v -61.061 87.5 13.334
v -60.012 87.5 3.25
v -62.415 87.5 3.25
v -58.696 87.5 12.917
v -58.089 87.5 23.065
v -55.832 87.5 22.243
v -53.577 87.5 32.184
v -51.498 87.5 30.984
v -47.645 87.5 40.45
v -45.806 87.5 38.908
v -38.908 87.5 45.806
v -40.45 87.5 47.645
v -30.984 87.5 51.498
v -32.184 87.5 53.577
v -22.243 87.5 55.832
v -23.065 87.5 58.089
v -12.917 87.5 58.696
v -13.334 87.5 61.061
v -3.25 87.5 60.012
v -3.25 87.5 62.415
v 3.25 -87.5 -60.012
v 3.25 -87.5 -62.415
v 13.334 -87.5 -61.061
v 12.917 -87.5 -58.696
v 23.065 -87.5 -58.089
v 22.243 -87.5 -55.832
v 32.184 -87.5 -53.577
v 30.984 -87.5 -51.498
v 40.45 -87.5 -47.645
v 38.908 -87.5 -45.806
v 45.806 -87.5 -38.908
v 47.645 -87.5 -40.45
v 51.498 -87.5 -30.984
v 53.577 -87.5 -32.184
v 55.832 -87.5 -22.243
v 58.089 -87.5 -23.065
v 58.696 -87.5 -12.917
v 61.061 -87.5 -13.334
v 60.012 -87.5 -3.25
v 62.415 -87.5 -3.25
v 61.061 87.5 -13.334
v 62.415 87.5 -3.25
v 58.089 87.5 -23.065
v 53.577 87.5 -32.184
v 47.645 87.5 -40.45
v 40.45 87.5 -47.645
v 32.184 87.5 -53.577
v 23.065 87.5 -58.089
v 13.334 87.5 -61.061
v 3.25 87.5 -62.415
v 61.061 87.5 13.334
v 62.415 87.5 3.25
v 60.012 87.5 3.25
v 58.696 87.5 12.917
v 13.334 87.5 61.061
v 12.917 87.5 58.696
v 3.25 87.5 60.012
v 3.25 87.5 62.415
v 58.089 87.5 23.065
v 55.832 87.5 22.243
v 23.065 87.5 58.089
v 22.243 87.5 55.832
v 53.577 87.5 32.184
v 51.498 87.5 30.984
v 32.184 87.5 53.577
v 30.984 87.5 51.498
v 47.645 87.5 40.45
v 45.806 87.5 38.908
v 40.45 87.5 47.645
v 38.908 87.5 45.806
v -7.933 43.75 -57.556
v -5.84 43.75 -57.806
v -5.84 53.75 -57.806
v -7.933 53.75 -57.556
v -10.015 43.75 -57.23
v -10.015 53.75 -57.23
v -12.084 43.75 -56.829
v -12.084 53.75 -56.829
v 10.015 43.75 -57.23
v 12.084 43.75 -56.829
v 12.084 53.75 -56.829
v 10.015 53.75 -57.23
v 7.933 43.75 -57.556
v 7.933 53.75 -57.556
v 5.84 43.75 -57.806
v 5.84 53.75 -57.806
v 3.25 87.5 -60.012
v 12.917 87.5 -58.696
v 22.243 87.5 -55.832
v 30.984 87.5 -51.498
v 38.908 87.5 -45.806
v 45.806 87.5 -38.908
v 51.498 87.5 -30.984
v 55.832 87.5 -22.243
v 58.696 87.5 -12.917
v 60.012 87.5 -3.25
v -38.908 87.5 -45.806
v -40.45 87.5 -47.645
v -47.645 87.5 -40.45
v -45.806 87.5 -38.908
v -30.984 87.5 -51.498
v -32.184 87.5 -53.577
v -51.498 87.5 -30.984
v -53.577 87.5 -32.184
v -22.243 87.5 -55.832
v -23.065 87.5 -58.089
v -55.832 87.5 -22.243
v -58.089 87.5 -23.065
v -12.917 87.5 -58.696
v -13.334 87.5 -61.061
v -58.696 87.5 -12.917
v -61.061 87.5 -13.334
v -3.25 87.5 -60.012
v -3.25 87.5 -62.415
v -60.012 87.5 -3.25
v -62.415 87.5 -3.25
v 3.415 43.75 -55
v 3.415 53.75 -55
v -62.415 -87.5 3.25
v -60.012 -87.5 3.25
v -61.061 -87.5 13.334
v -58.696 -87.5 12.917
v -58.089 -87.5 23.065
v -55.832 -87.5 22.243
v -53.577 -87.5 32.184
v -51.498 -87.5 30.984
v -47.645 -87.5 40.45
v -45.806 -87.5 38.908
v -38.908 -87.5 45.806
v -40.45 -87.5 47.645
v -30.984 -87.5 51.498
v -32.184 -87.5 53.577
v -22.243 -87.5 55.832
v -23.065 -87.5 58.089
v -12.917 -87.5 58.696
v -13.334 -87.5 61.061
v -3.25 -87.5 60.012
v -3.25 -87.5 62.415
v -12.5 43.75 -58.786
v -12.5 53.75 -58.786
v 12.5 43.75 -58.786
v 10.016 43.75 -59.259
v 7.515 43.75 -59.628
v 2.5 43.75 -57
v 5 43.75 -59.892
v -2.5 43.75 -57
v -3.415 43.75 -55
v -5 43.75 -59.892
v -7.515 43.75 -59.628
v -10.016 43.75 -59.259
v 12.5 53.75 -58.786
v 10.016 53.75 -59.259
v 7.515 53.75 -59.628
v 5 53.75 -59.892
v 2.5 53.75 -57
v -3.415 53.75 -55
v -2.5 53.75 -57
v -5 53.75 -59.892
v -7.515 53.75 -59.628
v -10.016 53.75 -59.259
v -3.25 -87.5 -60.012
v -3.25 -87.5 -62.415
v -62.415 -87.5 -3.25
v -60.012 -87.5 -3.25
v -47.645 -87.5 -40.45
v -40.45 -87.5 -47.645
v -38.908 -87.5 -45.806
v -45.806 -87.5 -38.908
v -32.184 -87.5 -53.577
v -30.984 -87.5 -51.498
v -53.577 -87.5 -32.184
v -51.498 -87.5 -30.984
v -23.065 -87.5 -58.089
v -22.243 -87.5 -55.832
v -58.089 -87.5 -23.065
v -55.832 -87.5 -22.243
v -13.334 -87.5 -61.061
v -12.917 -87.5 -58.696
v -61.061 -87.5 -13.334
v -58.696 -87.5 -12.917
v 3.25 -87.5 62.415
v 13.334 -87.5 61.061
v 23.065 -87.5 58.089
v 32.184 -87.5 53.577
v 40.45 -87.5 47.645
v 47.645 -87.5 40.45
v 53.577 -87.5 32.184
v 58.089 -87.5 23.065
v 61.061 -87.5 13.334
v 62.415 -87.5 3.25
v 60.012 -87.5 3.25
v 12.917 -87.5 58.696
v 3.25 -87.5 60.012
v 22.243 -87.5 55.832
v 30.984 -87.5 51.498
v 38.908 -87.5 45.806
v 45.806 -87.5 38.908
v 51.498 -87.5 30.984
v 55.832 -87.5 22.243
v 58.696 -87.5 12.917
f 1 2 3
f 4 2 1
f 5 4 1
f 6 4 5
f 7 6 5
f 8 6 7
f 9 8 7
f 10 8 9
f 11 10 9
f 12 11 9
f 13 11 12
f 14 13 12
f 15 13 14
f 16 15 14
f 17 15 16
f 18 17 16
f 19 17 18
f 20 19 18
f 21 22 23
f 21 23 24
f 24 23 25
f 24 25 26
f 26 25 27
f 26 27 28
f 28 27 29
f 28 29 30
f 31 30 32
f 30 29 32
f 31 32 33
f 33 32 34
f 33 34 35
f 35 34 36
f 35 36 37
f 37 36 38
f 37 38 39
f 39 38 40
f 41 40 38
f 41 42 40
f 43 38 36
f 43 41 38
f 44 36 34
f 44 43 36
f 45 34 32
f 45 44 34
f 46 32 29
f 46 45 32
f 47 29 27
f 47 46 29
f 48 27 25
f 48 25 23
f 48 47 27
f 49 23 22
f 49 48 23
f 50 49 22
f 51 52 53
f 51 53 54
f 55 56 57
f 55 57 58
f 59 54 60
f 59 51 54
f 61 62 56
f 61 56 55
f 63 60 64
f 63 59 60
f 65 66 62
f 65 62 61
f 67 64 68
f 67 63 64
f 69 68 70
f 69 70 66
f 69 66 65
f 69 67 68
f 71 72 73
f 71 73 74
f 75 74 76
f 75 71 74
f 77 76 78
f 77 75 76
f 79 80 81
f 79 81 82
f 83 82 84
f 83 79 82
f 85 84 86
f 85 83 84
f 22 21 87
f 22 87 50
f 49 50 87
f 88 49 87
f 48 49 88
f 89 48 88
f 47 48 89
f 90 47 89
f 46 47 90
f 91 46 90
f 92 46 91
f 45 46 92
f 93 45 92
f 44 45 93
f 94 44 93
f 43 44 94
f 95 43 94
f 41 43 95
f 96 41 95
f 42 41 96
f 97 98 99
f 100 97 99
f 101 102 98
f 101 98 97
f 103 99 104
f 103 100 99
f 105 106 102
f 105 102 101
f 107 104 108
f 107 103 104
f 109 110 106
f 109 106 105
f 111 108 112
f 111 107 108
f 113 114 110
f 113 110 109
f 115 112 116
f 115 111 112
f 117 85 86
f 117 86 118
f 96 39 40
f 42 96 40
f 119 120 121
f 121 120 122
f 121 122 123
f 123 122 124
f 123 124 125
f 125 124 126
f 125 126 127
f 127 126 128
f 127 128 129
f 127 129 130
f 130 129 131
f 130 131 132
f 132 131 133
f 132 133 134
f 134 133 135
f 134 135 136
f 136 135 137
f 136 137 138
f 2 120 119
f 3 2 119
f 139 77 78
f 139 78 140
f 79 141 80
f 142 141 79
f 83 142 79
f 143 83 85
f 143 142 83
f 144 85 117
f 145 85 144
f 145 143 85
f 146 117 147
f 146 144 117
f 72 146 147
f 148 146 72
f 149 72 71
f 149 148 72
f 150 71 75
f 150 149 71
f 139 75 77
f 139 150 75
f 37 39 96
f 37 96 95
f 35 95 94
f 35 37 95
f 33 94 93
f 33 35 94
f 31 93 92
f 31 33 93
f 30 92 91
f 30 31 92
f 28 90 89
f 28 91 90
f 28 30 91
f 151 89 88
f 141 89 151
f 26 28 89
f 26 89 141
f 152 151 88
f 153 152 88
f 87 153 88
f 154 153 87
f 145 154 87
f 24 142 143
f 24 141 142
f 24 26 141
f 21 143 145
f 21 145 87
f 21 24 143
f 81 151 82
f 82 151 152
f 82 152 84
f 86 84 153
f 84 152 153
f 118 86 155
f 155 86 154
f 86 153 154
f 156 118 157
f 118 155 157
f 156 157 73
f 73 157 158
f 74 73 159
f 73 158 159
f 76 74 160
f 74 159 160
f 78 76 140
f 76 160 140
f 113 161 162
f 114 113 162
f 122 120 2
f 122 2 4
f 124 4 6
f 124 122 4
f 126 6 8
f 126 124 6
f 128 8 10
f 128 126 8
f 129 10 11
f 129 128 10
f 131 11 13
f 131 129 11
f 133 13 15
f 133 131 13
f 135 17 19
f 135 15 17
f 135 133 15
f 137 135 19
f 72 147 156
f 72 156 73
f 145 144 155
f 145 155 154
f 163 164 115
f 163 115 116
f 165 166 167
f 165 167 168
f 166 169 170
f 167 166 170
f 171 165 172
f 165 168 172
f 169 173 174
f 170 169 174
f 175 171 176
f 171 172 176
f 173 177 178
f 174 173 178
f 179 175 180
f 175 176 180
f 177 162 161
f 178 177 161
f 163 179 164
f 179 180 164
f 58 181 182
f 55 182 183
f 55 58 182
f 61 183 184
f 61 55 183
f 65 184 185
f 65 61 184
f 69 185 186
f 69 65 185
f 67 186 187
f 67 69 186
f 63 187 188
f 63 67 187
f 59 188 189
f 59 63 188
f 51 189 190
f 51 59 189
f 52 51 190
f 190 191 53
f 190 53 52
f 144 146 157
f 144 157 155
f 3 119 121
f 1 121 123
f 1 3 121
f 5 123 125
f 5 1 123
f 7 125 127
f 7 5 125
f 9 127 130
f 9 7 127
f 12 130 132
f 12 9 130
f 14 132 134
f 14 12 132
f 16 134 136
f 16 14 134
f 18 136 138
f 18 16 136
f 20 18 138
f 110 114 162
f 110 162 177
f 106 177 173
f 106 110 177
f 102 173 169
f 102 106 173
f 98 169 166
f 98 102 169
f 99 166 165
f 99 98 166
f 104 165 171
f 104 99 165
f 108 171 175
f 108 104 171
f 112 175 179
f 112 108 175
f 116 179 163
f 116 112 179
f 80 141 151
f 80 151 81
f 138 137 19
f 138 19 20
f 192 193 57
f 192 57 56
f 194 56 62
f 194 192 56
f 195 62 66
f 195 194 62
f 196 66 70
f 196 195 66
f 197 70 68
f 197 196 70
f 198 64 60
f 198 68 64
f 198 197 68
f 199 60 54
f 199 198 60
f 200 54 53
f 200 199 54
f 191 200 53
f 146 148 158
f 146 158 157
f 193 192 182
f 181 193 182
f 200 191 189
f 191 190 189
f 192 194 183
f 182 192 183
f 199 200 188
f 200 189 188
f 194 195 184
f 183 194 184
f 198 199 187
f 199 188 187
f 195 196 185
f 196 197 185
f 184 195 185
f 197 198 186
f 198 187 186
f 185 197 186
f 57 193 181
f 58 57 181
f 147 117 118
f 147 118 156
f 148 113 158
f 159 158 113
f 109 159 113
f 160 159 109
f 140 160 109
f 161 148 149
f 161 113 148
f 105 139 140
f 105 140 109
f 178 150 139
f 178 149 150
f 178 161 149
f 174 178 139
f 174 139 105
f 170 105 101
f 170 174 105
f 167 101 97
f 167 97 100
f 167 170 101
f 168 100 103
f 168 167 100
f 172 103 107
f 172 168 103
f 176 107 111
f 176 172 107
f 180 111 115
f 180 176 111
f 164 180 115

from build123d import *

# Parameters (mm, degrees)
SKETCH1_R           = 62.5
SKETCH1_R_2         = 60.1
BOSS_EXTRUDE1_DEPTH = 87.5
SKETCH2_W           = 6.5
SKETCH2_H           = 2.487938712
CUT_EXTRUDE1_DEPTH  = 197.054839267
CIRPATTERN1_COUNT   = 4
EXTRUDE_THIN1_DEPTH = 10


with BuildPart() as part:
    # Sketch1 → Boss-Extrude1 (new, symmetric)
    with BuildSketch(Plane(origin=(0, 0, 0), x_dir=(1, 0, 0), z_dir=(0, 1, 0))):
        with Locations(Location((0, 0, 0), (0, 0, 270))):
            Circle(SKETCH1_R)
        with Locations(Location((0, 0, 0), (0, 0, 270))):
            Circle(SKETCH1_R_2, mode=Mode.SUBTRACT)
    extrude(amount=BOSS_EXTRUDE1_DEPTH, both=True)

    # Sketch2 → Cut-Extrude1 (cut, through all)
    with BuildSketch(Plane(origin=(0, 87.5, 0), x_dir=(1, 0, 0), z_dir=(0, 1, 0))):
        with Locations((0, 61.256030644)):
            Rectangle(SKETCH2_W, SKETCH2_H)
    cut_extrude1 = extrude(amount=-CUT_EXTRUDE1_DEPTH, mode=Mode.SUBTRACT)

    # CirPattern1: Cut-Extrude1 ×4 about axis
    cirpattern1_axis = Axis((0, 0, 0), (0, 1, 0))
    for i in range(1, CIRPATTERN1_COUNT):
        add(cut_extrude1.rotate(cirpattern1_axis, i * 360 / CIRPATTERN1_COUNT), mode=Mode.SUBTRACT)

    # Sketch3 → Extrude-Thin1 (add)
    with BuildSketch(Plane(origin=(0, 43.75, 0), x_dir=(1, 0, 0), z_dir=(0, 1, 0))):
        with BuildLine():
            ThreePointArc((-12.5, 58.78571255), (-8.767455481, 59.457057818), (-5, 59.891652173))
            Line((-5, 59.891652173), (-2.5, 57))
            Line((-2.5, 57), (2.5, 57))
            Line((2.5, 57), (5, 59.891652173))
            ThreePointArc((5, 59.891652173), (8.767455481, 59.457057818), (12.5, 58.78571255))
            Line((12.5, 58.78571255), (12.084026622, 56.829449237))
            ThreePointArc((12.084026622, 56.829449237), (8.975501228, 57.402529367), (5.840409558, 57.805705741))
            Line((5.840409558, 57.805705741), (3.414715203, 55))
            Line((3.414715203, 55), (-3.414715203, 55))
            Line((-3.414715203, 55), (-5.840409558, 57.805705741))
            ThreePointArc((-5.840409558, 57.805705741), (-8.975501228, 57.402529367), (-12.084026622, 56.829449237))
            Line((-12.084026622, 56.829449237), (-12.5, 58.78571255))
        make_face()
    extrude(amount=EXTRUDE_THIN1_DEPTH)


solid = part.part
